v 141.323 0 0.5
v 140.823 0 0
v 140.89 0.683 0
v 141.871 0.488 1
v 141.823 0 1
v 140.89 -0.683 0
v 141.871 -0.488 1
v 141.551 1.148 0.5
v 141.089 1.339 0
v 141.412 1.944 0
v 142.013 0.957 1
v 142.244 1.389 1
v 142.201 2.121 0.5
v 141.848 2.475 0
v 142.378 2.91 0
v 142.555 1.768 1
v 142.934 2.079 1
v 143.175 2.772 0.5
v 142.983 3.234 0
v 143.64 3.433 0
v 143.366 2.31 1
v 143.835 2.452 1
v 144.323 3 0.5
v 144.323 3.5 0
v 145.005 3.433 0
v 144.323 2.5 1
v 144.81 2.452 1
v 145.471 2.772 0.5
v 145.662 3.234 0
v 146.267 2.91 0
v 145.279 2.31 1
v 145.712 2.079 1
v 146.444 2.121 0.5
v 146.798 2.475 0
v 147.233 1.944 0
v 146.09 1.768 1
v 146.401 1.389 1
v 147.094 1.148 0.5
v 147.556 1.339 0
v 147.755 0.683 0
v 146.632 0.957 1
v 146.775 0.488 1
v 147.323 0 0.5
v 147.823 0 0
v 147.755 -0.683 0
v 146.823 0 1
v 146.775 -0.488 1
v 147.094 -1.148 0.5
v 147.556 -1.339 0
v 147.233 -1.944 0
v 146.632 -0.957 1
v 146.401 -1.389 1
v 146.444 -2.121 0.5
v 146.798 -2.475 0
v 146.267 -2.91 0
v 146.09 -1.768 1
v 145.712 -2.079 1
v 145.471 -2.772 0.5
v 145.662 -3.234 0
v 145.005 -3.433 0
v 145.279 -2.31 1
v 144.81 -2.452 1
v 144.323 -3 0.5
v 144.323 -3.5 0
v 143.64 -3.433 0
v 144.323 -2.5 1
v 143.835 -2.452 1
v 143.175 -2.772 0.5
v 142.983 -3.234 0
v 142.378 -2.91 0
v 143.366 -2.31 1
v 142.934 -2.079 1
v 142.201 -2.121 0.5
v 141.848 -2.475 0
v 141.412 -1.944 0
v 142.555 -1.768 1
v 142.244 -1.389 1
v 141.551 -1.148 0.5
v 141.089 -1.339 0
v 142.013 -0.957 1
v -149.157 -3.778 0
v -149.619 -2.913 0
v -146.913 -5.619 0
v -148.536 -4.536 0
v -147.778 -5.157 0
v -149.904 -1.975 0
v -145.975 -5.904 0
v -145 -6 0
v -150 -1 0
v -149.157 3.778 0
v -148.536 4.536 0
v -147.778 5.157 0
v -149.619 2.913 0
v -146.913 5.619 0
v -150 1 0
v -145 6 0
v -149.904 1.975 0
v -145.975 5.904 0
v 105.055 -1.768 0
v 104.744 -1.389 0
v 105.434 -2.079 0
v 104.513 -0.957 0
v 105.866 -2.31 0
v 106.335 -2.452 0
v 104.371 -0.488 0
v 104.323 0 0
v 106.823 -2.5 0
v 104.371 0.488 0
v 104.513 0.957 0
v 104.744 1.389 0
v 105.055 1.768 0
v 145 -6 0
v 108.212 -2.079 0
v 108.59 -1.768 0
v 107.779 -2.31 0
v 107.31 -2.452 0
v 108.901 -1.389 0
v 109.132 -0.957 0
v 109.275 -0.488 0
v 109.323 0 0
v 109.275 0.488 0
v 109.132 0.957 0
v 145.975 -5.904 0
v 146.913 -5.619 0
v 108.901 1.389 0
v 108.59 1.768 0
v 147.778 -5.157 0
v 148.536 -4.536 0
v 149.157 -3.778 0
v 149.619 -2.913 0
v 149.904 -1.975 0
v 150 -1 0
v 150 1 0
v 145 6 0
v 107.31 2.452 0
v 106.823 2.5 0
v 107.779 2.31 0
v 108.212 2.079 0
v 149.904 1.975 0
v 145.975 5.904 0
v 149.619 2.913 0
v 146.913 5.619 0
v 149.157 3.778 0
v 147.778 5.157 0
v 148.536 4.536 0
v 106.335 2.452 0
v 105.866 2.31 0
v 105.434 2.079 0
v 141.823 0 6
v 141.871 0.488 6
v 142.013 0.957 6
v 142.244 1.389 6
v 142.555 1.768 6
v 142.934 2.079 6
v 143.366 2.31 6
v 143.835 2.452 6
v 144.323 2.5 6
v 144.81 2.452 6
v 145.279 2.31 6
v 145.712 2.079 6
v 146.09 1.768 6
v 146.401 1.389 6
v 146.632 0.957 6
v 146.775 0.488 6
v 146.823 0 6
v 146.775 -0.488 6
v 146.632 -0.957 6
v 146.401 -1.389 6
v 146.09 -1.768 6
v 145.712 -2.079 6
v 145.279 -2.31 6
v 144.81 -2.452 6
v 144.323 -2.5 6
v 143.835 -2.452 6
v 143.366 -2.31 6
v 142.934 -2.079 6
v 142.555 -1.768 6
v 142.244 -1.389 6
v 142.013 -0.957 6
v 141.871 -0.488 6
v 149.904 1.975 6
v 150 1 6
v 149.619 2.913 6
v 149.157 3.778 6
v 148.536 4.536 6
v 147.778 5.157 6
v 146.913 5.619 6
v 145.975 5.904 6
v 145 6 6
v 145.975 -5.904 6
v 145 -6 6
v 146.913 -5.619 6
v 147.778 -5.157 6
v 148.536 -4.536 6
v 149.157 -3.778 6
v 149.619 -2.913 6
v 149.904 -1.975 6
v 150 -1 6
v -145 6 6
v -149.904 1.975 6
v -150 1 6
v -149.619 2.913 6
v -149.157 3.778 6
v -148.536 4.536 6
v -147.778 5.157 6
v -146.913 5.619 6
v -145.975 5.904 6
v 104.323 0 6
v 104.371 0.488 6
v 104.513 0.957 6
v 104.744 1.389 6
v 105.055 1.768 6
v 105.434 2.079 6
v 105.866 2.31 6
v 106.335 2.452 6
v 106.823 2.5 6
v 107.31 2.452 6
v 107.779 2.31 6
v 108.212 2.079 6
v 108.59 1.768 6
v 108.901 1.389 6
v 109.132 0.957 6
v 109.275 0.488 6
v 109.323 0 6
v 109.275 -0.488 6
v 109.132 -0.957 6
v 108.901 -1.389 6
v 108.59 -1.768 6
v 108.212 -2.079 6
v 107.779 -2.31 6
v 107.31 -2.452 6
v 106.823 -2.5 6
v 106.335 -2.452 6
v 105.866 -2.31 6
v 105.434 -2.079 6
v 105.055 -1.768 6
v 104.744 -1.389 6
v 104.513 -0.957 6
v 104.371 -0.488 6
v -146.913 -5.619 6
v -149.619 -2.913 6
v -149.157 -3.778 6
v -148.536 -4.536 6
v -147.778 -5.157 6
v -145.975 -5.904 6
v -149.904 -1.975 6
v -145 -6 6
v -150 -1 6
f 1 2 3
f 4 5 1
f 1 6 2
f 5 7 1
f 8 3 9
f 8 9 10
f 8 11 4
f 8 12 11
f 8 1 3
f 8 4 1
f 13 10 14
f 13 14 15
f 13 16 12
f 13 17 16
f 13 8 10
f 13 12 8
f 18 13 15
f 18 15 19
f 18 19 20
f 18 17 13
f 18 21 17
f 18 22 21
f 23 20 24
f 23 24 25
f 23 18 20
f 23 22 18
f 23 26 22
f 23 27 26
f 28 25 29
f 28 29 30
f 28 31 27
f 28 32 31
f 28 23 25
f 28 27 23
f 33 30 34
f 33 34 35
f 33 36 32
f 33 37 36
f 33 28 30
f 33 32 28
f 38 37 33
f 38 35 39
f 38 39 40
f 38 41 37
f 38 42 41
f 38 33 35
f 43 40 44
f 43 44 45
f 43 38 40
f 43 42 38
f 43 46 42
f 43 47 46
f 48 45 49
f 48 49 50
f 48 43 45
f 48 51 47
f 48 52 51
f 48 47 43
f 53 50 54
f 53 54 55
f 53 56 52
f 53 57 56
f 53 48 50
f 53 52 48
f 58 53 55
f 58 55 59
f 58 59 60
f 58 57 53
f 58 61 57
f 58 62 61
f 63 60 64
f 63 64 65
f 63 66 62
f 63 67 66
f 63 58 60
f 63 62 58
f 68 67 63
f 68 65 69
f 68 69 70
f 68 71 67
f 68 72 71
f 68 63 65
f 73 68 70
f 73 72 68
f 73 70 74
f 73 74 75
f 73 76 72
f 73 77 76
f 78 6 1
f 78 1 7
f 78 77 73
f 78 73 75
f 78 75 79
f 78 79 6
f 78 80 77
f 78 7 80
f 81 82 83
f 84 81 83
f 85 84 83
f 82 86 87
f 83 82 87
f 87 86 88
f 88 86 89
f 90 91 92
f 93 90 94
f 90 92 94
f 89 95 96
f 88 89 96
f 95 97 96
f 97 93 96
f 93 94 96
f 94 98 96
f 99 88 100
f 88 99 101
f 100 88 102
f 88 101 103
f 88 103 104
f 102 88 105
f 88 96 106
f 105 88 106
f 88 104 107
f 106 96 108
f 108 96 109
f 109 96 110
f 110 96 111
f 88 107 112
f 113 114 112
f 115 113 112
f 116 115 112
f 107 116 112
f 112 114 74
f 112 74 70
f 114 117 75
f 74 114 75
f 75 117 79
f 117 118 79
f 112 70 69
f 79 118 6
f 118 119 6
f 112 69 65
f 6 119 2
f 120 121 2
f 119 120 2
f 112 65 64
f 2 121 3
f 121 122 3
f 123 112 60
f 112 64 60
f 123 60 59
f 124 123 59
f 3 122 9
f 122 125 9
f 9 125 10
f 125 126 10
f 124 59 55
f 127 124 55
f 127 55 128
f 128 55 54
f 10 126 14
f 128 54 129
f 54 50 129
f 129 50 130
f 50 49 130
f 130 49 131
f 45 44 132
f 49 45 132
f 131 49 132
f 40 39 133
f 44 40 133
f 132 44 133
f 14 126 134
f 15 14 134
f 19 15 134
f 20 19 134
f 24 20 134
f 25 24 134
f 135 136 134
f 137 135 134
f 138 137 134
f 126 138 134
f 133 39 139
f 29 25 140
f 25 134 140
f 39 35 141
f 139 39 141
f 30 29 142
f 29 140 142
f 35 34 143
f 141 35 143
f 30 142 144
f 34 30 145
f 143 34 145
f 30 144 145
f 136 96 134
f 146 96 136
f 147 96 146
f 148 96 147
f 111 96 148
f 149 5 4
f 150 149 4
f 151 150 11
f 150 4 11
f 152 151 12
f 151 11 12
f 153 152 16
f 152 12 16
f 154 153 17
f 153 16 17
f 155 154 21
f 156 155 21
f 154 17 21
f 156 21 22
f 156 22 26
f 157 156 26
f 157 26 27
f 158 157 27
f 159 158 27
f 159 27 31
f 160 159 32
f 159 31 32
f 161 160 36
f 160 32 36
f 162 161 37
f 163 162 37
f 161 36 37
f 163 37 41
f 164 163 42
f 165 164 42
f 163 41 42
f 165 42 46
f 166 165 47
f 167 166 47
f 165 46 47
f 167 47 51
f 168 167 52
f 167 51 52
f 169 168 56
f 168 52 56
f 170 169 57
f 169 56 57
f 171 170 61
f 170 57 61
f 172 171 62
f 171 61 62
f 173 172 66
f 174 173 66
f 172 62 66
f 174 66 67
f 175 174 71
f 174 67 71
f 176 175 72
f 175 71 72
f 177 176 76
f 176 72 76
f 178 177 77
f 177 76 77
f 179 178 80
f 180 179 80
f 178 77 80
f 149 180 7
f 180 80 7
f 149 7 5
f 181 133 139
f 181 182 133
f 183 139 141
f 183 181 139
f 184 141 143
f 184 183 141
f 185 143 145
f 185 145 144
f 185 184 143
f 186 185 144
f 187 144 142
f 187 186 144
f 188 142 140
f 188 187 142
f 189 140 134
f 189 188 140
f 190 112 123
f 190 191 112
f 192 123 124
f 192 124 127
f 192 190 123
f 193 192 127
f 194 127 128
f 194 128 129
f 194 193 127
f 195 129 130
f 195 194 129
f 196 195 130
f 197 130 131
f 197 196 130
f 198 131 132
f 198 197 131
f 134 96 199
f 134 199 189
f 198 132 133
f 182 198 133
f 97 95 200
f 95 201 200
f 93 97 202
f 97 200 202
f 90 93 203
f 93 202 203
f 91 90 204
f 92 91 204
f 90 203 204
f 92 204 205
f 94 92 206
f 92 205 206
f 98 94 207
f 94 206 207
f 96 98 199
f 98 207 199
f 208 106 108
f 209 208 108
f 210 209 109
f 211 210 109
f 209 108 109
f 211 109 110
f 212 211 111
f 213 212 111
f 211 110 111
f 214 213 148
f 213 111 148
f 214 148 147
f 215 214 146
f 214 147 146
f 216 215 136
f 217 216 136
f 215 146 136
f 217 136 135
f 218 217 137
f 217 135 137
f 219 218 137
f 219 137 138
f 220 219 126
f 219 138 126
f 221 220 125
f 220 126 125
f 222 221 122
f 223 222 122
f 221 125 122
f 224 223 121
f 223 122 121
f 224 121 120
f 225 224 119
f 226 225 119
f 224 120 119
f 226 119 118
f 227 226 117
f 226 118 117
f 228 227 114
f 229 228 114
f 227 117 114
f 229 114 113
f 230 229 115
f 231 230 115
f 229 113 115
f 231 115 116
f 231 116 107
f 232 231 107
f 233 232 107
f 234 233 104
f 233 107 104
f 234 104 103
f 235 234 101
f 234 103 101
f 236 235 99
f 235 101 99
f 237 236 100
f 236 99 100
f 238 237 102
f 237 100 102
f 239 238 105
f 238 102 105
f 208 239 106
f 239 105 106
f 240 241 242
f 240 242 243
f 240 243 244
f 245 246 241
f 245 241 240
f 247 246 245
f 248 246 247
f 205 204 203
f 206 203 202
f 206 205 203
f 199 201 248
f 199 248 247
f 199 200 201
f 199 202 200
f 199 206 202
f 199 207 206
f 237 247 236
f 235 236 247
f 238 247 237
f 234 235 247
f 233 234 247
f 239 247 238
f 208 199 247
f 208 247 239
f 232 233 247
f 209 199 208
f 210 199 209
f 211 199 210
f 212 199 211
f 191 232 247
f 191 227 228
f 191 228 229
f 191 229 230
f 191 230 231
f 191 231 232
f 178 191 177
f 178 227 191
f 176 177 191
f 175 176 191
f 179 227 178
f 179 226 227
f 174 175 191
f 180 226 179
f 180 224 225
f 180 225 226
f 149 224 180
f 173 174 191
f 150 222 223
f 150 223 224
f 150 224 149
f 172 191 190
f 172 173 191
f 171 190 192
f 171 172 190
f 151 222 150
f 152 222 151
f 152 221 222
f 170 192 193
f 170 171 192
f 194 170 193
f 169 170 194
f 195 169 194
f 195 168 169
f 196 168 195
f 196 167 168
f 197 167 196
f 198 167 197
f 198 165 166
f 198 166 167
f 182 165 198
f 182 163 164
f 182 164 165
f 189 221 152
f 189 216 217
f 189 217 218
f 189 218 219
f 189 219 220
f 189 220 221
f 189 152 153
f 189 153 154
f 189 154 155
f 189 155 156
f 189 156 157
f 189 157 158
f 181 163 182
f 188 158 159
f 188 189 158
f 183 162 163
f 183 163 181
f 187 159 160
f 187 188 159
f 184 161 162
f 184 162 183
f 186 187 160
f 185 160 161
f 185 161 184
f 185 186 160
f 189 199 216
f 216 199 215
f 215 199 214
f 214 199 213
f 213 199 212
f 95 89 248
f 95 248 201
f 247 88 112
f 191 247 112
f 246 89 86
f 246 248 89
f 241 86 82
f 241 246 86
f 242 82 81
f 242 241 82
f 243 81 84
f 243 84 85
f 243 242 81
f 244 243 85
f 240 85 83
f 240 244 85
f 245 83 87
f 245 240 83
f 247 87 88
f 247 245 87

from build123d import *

# Parameters (mm, degrees)
SKETCH1_W           = 300
SKETCH1_H           = 12
BOSS_EXTRUDE1_DEPTH = 6
FILLET1_R           = 5
SKETCH2_R           = 2.5
CUT_EXTRUDE1_DEPTH  = 6
CHAMFER2_SIZE       = 1


with BuildPart() as part:
    # Sketch1 → Boss-Extrude1 (new body)
    with BuildSketch(Plane.XY):
        Rectangle(SKETCH1_W, SKETCH1_H)
    extrude(amount=BOSS_EXTRUDE1_DEPTH)

    # Fillet1
    fillet1_edges = [part.edges().sort_by_distance(p)[0] for p in [
        (150, -6, 3),
        (-150, -6, 3),
        (-150, 6, 3),
        (150, 6, 3),
    ]]
    fillet(fillet1_edges, radius=FILLET1_R)

    # Sketch2 → Cut-Extrude1 (cut)
    with BuildSketch(Plane(origin=(0, 0, 0), x_dir=(-1, 0, 0), z_dir=(0, 0, -1))):
        with Locations((-144.32263712, 0)):
            Circle(SKETCH2_R)
        with Locations((-106.82263712, 0)):
            Circle(SKETCH2_R)
    extrude(amount=-CUT_EXTRUDE1_DEPTH, mode=Mode.SUBTRACT)

    # Chamfer2
    chamfer2_edges = [part.edges().sort_by_distance(p)[0] for p in [
        (146.82263712, 0, 0),
    ]]
    chamfer(chamfer2_edges, length=CHAMFER2_SIZE)


solid = part.part
